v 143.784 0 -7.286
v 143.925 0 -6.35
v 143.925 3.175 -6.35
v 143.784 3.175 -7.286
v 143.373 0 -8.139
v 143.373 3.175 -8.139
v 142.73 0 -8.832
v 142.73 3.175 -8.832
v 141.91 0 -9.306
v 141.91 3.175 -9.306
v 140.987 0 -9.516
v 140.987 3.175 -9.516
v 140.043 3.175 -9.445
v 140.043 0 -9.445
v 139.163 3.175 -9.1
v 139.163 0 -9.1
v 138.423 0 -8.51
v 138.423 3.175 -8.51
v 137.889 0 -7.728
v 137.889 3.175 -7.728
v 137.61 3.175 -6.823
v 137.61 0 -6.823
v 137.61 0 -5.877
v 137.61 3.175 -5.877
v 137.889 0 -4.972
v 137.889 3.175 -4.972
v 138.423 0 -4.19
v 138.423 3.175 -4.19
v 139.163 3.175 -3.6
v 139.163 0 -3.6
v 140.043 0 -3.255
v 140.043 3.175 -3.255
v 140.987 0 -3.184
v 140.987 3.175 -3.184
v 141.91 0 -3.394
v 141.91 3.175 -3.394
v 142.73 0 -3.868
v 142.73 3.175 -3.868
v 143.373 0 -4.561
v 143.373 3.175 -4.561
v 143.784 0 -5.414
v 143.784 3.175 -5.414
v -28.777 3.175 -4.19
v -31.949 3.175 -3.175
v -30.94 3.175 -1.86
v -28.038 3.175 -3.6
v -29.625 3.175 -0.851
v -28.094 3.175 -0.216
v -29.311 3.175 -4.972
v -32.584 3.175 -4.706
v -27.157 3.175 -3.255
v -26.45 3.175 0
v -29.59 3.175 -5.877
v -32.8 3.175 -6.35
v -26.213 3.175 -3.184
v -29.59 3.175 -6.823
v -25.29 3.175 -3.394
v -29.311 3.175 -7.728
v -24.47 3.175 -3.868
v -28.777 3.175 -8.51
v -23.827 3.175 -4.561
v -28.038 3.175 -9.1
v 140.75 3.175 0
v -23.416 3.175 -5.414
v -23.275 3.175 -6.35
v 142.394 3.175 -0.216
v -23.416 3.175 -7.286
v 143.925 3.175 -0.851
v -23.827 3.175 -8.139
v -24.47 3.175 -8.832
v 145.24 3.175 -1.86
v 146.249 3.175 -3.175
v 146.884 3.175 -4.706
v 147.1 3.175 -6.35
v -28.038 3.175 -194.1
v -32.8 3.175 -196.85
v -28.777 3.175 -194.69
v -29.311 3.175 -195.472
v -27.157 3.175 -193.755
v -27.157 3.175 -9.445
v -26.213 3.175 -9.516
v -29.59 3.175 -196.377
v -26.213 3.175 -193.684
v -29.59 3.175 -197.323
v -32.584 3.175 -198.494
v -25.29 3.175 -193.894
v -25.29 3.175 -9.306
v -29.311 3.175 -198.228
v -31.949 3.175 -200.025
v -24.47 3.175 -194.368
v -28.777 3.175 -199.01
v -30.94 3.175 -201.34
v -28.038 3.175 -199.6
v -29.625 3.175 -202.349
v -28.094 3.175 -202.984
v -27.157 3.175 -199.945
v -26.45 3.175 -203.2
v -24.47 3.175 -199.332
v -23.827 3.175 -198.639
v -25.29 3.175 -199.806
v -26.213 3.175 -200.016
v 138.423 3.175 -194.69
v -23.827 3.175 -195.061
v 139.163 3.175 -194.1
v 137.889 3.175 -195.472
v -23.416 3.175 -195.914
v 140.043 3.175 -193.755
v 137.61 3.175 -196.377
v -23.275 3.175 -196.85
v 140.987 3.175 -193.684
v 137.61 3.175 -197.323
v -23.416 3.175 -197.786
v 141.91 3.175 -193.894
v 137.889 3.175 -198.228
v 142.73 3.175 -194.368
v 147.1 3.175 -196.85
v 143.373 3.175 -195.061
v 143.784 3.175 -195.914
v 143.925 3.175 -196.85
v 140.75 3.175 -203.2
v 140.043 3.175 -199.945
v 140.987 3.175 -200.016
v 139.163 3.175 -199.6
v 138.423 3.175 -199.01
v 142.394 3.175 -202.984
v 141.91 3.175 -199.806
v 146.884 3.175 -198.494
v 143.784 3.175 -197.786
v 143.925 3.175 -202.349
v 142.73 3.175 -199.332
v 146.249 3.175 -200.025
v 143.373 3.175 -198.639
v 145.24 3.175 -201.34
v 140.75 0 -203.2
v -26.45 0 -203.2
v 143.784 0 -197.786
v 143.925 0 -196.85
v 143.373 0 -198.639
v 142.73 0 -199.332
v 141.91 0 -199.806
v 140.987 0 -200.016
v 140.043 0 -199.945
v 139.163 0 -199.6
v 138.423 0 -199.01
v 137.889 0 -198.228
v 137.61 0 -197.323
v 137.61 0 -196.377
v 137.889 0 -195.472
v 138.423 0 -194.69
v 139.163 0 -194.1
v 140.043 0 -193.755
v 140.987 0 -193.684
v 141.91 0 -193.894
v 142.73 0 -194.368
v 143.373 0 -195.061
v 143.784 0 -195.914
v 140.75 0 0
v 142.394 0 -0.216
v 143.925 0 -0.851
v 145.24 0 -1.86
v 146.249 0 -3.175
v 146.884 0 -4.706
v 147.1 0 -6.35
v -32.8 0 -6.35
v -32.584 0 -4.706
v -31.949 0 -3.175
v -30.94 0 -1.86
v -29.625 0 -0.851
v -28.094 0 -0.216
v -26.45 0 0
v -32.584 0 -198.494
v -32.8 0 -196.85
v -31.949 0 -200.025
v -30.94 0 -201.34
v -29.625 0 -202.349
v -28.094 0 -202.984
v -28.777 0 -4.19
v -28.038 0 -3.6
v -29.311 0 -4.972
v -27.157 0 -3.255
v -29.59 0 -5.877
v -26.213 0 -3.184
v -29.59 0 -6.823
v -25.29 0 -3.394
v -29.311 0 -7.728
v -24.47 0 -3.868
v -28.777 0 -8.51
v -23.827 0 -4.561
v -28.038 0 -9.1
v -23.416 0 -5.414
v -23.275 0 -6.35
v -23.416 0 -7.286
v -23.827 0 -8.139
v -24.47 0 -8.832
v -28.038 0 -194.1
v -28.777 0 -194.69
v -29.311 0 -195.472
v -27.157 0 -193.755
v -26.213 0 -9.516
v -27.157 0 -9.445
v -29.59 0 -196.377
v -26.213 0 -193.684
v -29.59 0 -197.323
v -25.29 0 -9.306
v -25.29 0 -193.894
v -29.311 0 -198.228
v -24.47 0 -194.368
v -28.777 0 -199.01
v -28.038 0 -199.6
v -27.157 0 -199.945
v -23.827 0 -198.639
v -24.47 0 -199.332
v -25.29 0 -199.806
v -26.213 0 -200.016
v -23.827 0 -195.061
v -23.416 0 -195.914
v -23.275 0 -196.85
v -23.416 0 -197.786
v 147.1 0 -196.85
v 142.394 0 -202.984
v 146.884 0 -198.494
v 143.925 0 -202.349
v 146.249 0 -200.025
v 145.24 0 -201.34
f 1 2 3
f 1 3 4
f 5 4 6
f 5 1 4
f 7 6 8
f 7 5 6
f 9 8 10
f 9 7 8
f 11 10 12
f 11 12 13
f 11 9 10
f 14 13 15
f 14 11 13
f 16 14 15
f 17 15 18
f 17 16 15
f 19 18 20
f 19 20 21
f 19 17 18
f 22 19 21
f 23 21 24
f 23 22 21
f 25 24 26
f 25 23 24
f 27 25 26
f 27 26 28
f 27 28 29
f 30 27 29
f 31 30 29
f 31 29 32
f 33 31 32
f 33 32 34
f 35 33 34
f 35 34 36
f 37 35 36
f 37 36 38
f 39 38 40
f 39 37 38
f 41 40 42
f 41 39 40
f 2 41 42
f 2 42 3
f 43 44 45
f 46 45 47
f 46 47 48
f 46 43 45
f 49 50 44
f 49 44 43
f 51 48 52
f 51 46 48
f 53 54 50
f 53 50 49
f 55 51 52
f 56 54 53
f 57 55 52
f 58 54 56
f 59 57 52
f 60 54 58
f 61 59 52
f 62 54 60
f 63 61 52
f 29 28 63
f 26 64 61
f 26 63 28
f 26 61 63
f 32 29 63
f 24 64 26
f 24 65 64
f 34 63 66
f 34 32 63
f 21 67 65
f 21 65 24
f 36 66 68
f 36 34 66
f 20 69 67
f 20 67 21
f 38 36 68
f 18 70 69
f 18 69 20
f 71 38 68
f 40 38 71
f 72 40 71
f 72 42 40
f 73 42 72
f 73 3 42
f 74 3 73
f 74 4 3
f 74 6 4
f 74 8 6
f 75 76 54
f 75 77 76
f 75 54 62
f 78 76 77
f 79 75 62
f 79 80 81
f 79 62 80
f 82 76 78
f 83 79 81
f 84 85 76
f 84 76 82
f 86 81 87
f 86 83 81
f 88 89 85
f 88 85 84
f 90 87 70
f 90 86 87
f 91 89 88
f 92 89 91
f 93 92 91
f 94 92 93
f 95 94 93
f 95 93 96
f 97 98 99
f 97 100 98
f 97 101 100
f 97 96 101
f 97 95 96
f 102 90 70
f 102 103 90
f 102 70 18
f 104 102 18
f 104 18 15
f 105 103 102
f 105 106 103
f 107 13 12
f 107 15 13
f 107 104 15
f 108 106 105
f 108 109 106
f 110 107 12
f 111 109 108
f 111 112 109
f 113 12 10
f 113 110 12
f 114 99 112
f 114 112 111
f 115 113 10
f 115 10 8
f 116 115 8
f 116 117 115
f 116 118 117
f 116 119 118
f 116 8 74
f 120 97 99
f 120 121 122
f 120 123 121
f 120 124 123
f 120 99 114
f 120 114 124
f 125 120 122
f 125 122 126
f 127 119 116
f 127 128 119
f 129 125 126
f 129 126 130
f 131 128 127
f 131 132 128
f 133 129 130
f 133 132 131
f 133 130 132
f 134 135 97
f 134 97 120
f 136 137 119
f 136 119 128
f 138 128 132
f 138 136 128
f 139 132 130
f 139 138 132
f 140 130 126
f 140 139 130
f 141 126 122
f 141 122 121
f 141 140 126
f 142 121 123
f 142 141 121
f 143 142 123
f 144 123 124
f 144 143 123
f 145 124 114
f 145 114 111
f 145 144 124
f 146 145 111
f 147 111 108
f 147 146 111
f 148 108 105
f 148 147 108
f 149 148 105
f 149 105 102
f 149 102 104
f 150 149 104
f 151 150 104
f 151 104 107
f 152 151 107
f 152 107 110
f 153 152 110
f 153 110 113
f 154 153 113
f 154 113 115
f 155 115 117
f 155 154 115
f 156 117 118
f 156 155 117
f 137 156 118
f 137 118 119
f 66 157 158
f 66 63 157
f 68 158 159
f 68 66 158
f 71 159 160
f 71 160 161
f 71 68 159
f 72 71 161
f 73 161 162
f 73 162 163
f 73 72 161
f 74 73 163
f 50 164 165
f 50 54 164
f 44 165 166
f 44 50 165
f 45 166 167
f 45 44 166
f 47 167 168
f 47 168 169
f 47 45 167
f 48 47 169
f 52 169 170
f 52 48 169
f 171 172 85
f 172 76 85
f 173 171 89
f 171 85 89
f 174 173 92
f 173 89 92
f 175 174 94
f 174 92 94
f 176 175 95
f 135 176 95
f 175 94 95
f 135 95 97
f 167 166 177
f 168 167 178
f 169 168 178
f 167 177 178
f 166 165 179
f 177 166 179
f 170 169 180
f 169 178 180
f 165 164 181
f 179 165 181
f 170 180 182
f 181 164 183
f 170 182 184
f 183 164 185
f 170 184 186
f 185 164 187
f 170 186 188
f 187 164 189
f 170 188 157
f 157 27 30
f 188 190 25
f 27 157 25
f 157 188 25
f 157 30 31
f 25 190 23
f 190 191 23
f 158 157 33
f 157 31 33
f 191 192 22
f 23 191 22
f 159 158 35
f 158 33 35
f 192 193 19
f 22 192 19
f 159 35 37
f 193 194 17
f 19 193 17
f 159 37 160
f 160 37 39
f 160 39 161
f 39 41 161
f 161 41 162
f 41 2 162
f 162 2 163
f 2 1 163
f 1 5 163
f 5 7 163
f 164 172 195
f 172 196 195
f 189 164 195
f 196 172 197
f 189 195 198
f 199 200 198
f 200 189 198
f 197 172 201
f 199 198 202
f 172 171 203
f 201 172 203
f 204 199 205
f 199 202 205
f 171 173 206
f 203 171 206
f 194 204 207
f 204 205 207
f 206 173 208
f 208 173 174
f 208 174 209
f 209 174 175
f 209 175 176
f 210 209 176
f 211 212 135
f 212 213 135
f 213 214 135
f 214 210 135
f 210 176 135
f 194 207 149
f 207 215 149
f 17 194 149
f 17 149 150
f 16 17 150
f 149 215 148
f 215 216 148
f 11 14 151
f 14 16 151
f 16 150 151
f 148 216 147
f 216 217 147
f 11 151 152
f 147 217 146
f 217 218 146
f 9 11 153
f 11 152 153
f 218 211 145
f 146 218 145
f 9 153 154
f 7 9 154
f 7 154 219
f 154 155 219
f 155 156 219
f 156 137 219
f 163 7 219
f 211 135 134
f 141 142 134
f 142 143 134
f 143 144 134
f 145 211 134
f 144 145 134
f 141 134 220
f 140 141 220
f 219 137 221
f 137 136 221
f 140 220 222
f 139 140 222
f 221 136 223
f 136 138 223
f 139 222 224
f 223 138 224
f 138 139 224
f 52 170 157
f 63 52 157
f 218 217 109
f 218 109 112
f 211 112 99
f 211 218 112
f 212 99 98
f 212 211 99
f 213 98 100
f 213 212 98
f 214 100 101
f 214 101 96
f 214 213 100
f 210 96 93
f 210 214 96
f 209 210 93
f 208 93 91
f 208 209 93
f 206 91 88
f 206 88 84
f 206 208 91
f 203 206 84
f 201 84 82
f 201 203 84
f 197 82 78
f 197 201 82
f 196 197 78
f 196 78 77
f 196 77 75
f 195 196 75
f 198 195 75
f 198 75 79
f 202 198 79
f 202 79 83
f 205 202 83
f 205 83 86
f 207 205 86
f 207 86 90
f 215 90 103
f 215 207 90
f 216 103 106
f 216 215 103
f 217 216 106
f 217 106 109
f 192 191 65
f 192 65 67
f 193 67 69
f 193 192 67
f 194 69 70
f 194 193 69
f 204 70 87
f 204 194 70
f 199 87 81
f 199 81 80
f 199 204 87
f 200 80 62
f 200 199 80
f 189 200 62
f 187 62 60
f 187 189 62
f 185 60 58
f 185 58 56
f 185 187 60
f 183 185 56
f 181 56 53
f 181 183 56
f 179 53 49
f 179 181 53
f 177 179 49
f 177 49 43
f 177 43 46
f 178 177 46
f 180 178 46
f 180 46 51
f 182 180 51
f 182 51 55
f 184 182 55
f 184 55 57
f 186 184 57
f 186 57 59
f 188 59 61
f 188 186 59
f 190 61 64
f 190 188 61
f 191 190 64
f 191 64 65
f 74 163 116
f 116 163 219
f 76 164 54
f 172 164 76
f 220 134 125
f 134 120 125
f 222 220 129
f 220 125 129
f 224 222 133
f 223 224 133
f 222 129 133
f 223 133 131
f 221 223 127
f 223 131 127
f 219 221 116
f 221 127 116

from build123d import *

# Parameters (mm, degrees)
SKETCH1_W           = 179.900000372
SKETCH1_H           = 203.2
SKETCH1_R           = 3.175
BOSS_EXTRUDE1_DEPTH = 3.175
FILLET1_R           = 6.35


with BuildPart() as part:
    # Sketch1 → Boss-Extrude1 (new body)
    with BuildSketch(Plane(origin=(0, 0, 0), x_dir=(1, 0, 0), z_dir=(0, 1, 0))):
        with Locations((57.15, 101.6)):
            Rectangle(SKETCH1_W, SKETCH1_H)
        with Locations((-26.450000186, 6.35)):
            Circle(SKETCH1_R, mode=Mode.SUBTRACT)
        with Locations((140.750000186, 6.35)):
            Circle(SKETCH1_R, mode=Mode.SUBTRACT)
        with Locations((-26.450000186, 196.85)):
            Circle(SKETCH1_R, mode=Mode.SUBTRACT)
        with Locations((140.750000186, 196.85)):
            Circle(SKETCH1_R, mode=Mode.SUBTRACT)
    extrude(amount=BOSS_EXTRUDE1_DEPTH)

    # Fillet1
    fillet1_edges = [part.edges().sort_by_distance(p)[0] for p in [
        (-32.800000186, 1.5875, -203.2),
        (147.100000186, 1.5875, -203.2),
        (147.100000186, 1.5875, 0),
        (-32.800000186, 1.5875, 0),
    ]]
    fillet(fillet1_edges, radius=FILLET1_R)


solid = part.part
